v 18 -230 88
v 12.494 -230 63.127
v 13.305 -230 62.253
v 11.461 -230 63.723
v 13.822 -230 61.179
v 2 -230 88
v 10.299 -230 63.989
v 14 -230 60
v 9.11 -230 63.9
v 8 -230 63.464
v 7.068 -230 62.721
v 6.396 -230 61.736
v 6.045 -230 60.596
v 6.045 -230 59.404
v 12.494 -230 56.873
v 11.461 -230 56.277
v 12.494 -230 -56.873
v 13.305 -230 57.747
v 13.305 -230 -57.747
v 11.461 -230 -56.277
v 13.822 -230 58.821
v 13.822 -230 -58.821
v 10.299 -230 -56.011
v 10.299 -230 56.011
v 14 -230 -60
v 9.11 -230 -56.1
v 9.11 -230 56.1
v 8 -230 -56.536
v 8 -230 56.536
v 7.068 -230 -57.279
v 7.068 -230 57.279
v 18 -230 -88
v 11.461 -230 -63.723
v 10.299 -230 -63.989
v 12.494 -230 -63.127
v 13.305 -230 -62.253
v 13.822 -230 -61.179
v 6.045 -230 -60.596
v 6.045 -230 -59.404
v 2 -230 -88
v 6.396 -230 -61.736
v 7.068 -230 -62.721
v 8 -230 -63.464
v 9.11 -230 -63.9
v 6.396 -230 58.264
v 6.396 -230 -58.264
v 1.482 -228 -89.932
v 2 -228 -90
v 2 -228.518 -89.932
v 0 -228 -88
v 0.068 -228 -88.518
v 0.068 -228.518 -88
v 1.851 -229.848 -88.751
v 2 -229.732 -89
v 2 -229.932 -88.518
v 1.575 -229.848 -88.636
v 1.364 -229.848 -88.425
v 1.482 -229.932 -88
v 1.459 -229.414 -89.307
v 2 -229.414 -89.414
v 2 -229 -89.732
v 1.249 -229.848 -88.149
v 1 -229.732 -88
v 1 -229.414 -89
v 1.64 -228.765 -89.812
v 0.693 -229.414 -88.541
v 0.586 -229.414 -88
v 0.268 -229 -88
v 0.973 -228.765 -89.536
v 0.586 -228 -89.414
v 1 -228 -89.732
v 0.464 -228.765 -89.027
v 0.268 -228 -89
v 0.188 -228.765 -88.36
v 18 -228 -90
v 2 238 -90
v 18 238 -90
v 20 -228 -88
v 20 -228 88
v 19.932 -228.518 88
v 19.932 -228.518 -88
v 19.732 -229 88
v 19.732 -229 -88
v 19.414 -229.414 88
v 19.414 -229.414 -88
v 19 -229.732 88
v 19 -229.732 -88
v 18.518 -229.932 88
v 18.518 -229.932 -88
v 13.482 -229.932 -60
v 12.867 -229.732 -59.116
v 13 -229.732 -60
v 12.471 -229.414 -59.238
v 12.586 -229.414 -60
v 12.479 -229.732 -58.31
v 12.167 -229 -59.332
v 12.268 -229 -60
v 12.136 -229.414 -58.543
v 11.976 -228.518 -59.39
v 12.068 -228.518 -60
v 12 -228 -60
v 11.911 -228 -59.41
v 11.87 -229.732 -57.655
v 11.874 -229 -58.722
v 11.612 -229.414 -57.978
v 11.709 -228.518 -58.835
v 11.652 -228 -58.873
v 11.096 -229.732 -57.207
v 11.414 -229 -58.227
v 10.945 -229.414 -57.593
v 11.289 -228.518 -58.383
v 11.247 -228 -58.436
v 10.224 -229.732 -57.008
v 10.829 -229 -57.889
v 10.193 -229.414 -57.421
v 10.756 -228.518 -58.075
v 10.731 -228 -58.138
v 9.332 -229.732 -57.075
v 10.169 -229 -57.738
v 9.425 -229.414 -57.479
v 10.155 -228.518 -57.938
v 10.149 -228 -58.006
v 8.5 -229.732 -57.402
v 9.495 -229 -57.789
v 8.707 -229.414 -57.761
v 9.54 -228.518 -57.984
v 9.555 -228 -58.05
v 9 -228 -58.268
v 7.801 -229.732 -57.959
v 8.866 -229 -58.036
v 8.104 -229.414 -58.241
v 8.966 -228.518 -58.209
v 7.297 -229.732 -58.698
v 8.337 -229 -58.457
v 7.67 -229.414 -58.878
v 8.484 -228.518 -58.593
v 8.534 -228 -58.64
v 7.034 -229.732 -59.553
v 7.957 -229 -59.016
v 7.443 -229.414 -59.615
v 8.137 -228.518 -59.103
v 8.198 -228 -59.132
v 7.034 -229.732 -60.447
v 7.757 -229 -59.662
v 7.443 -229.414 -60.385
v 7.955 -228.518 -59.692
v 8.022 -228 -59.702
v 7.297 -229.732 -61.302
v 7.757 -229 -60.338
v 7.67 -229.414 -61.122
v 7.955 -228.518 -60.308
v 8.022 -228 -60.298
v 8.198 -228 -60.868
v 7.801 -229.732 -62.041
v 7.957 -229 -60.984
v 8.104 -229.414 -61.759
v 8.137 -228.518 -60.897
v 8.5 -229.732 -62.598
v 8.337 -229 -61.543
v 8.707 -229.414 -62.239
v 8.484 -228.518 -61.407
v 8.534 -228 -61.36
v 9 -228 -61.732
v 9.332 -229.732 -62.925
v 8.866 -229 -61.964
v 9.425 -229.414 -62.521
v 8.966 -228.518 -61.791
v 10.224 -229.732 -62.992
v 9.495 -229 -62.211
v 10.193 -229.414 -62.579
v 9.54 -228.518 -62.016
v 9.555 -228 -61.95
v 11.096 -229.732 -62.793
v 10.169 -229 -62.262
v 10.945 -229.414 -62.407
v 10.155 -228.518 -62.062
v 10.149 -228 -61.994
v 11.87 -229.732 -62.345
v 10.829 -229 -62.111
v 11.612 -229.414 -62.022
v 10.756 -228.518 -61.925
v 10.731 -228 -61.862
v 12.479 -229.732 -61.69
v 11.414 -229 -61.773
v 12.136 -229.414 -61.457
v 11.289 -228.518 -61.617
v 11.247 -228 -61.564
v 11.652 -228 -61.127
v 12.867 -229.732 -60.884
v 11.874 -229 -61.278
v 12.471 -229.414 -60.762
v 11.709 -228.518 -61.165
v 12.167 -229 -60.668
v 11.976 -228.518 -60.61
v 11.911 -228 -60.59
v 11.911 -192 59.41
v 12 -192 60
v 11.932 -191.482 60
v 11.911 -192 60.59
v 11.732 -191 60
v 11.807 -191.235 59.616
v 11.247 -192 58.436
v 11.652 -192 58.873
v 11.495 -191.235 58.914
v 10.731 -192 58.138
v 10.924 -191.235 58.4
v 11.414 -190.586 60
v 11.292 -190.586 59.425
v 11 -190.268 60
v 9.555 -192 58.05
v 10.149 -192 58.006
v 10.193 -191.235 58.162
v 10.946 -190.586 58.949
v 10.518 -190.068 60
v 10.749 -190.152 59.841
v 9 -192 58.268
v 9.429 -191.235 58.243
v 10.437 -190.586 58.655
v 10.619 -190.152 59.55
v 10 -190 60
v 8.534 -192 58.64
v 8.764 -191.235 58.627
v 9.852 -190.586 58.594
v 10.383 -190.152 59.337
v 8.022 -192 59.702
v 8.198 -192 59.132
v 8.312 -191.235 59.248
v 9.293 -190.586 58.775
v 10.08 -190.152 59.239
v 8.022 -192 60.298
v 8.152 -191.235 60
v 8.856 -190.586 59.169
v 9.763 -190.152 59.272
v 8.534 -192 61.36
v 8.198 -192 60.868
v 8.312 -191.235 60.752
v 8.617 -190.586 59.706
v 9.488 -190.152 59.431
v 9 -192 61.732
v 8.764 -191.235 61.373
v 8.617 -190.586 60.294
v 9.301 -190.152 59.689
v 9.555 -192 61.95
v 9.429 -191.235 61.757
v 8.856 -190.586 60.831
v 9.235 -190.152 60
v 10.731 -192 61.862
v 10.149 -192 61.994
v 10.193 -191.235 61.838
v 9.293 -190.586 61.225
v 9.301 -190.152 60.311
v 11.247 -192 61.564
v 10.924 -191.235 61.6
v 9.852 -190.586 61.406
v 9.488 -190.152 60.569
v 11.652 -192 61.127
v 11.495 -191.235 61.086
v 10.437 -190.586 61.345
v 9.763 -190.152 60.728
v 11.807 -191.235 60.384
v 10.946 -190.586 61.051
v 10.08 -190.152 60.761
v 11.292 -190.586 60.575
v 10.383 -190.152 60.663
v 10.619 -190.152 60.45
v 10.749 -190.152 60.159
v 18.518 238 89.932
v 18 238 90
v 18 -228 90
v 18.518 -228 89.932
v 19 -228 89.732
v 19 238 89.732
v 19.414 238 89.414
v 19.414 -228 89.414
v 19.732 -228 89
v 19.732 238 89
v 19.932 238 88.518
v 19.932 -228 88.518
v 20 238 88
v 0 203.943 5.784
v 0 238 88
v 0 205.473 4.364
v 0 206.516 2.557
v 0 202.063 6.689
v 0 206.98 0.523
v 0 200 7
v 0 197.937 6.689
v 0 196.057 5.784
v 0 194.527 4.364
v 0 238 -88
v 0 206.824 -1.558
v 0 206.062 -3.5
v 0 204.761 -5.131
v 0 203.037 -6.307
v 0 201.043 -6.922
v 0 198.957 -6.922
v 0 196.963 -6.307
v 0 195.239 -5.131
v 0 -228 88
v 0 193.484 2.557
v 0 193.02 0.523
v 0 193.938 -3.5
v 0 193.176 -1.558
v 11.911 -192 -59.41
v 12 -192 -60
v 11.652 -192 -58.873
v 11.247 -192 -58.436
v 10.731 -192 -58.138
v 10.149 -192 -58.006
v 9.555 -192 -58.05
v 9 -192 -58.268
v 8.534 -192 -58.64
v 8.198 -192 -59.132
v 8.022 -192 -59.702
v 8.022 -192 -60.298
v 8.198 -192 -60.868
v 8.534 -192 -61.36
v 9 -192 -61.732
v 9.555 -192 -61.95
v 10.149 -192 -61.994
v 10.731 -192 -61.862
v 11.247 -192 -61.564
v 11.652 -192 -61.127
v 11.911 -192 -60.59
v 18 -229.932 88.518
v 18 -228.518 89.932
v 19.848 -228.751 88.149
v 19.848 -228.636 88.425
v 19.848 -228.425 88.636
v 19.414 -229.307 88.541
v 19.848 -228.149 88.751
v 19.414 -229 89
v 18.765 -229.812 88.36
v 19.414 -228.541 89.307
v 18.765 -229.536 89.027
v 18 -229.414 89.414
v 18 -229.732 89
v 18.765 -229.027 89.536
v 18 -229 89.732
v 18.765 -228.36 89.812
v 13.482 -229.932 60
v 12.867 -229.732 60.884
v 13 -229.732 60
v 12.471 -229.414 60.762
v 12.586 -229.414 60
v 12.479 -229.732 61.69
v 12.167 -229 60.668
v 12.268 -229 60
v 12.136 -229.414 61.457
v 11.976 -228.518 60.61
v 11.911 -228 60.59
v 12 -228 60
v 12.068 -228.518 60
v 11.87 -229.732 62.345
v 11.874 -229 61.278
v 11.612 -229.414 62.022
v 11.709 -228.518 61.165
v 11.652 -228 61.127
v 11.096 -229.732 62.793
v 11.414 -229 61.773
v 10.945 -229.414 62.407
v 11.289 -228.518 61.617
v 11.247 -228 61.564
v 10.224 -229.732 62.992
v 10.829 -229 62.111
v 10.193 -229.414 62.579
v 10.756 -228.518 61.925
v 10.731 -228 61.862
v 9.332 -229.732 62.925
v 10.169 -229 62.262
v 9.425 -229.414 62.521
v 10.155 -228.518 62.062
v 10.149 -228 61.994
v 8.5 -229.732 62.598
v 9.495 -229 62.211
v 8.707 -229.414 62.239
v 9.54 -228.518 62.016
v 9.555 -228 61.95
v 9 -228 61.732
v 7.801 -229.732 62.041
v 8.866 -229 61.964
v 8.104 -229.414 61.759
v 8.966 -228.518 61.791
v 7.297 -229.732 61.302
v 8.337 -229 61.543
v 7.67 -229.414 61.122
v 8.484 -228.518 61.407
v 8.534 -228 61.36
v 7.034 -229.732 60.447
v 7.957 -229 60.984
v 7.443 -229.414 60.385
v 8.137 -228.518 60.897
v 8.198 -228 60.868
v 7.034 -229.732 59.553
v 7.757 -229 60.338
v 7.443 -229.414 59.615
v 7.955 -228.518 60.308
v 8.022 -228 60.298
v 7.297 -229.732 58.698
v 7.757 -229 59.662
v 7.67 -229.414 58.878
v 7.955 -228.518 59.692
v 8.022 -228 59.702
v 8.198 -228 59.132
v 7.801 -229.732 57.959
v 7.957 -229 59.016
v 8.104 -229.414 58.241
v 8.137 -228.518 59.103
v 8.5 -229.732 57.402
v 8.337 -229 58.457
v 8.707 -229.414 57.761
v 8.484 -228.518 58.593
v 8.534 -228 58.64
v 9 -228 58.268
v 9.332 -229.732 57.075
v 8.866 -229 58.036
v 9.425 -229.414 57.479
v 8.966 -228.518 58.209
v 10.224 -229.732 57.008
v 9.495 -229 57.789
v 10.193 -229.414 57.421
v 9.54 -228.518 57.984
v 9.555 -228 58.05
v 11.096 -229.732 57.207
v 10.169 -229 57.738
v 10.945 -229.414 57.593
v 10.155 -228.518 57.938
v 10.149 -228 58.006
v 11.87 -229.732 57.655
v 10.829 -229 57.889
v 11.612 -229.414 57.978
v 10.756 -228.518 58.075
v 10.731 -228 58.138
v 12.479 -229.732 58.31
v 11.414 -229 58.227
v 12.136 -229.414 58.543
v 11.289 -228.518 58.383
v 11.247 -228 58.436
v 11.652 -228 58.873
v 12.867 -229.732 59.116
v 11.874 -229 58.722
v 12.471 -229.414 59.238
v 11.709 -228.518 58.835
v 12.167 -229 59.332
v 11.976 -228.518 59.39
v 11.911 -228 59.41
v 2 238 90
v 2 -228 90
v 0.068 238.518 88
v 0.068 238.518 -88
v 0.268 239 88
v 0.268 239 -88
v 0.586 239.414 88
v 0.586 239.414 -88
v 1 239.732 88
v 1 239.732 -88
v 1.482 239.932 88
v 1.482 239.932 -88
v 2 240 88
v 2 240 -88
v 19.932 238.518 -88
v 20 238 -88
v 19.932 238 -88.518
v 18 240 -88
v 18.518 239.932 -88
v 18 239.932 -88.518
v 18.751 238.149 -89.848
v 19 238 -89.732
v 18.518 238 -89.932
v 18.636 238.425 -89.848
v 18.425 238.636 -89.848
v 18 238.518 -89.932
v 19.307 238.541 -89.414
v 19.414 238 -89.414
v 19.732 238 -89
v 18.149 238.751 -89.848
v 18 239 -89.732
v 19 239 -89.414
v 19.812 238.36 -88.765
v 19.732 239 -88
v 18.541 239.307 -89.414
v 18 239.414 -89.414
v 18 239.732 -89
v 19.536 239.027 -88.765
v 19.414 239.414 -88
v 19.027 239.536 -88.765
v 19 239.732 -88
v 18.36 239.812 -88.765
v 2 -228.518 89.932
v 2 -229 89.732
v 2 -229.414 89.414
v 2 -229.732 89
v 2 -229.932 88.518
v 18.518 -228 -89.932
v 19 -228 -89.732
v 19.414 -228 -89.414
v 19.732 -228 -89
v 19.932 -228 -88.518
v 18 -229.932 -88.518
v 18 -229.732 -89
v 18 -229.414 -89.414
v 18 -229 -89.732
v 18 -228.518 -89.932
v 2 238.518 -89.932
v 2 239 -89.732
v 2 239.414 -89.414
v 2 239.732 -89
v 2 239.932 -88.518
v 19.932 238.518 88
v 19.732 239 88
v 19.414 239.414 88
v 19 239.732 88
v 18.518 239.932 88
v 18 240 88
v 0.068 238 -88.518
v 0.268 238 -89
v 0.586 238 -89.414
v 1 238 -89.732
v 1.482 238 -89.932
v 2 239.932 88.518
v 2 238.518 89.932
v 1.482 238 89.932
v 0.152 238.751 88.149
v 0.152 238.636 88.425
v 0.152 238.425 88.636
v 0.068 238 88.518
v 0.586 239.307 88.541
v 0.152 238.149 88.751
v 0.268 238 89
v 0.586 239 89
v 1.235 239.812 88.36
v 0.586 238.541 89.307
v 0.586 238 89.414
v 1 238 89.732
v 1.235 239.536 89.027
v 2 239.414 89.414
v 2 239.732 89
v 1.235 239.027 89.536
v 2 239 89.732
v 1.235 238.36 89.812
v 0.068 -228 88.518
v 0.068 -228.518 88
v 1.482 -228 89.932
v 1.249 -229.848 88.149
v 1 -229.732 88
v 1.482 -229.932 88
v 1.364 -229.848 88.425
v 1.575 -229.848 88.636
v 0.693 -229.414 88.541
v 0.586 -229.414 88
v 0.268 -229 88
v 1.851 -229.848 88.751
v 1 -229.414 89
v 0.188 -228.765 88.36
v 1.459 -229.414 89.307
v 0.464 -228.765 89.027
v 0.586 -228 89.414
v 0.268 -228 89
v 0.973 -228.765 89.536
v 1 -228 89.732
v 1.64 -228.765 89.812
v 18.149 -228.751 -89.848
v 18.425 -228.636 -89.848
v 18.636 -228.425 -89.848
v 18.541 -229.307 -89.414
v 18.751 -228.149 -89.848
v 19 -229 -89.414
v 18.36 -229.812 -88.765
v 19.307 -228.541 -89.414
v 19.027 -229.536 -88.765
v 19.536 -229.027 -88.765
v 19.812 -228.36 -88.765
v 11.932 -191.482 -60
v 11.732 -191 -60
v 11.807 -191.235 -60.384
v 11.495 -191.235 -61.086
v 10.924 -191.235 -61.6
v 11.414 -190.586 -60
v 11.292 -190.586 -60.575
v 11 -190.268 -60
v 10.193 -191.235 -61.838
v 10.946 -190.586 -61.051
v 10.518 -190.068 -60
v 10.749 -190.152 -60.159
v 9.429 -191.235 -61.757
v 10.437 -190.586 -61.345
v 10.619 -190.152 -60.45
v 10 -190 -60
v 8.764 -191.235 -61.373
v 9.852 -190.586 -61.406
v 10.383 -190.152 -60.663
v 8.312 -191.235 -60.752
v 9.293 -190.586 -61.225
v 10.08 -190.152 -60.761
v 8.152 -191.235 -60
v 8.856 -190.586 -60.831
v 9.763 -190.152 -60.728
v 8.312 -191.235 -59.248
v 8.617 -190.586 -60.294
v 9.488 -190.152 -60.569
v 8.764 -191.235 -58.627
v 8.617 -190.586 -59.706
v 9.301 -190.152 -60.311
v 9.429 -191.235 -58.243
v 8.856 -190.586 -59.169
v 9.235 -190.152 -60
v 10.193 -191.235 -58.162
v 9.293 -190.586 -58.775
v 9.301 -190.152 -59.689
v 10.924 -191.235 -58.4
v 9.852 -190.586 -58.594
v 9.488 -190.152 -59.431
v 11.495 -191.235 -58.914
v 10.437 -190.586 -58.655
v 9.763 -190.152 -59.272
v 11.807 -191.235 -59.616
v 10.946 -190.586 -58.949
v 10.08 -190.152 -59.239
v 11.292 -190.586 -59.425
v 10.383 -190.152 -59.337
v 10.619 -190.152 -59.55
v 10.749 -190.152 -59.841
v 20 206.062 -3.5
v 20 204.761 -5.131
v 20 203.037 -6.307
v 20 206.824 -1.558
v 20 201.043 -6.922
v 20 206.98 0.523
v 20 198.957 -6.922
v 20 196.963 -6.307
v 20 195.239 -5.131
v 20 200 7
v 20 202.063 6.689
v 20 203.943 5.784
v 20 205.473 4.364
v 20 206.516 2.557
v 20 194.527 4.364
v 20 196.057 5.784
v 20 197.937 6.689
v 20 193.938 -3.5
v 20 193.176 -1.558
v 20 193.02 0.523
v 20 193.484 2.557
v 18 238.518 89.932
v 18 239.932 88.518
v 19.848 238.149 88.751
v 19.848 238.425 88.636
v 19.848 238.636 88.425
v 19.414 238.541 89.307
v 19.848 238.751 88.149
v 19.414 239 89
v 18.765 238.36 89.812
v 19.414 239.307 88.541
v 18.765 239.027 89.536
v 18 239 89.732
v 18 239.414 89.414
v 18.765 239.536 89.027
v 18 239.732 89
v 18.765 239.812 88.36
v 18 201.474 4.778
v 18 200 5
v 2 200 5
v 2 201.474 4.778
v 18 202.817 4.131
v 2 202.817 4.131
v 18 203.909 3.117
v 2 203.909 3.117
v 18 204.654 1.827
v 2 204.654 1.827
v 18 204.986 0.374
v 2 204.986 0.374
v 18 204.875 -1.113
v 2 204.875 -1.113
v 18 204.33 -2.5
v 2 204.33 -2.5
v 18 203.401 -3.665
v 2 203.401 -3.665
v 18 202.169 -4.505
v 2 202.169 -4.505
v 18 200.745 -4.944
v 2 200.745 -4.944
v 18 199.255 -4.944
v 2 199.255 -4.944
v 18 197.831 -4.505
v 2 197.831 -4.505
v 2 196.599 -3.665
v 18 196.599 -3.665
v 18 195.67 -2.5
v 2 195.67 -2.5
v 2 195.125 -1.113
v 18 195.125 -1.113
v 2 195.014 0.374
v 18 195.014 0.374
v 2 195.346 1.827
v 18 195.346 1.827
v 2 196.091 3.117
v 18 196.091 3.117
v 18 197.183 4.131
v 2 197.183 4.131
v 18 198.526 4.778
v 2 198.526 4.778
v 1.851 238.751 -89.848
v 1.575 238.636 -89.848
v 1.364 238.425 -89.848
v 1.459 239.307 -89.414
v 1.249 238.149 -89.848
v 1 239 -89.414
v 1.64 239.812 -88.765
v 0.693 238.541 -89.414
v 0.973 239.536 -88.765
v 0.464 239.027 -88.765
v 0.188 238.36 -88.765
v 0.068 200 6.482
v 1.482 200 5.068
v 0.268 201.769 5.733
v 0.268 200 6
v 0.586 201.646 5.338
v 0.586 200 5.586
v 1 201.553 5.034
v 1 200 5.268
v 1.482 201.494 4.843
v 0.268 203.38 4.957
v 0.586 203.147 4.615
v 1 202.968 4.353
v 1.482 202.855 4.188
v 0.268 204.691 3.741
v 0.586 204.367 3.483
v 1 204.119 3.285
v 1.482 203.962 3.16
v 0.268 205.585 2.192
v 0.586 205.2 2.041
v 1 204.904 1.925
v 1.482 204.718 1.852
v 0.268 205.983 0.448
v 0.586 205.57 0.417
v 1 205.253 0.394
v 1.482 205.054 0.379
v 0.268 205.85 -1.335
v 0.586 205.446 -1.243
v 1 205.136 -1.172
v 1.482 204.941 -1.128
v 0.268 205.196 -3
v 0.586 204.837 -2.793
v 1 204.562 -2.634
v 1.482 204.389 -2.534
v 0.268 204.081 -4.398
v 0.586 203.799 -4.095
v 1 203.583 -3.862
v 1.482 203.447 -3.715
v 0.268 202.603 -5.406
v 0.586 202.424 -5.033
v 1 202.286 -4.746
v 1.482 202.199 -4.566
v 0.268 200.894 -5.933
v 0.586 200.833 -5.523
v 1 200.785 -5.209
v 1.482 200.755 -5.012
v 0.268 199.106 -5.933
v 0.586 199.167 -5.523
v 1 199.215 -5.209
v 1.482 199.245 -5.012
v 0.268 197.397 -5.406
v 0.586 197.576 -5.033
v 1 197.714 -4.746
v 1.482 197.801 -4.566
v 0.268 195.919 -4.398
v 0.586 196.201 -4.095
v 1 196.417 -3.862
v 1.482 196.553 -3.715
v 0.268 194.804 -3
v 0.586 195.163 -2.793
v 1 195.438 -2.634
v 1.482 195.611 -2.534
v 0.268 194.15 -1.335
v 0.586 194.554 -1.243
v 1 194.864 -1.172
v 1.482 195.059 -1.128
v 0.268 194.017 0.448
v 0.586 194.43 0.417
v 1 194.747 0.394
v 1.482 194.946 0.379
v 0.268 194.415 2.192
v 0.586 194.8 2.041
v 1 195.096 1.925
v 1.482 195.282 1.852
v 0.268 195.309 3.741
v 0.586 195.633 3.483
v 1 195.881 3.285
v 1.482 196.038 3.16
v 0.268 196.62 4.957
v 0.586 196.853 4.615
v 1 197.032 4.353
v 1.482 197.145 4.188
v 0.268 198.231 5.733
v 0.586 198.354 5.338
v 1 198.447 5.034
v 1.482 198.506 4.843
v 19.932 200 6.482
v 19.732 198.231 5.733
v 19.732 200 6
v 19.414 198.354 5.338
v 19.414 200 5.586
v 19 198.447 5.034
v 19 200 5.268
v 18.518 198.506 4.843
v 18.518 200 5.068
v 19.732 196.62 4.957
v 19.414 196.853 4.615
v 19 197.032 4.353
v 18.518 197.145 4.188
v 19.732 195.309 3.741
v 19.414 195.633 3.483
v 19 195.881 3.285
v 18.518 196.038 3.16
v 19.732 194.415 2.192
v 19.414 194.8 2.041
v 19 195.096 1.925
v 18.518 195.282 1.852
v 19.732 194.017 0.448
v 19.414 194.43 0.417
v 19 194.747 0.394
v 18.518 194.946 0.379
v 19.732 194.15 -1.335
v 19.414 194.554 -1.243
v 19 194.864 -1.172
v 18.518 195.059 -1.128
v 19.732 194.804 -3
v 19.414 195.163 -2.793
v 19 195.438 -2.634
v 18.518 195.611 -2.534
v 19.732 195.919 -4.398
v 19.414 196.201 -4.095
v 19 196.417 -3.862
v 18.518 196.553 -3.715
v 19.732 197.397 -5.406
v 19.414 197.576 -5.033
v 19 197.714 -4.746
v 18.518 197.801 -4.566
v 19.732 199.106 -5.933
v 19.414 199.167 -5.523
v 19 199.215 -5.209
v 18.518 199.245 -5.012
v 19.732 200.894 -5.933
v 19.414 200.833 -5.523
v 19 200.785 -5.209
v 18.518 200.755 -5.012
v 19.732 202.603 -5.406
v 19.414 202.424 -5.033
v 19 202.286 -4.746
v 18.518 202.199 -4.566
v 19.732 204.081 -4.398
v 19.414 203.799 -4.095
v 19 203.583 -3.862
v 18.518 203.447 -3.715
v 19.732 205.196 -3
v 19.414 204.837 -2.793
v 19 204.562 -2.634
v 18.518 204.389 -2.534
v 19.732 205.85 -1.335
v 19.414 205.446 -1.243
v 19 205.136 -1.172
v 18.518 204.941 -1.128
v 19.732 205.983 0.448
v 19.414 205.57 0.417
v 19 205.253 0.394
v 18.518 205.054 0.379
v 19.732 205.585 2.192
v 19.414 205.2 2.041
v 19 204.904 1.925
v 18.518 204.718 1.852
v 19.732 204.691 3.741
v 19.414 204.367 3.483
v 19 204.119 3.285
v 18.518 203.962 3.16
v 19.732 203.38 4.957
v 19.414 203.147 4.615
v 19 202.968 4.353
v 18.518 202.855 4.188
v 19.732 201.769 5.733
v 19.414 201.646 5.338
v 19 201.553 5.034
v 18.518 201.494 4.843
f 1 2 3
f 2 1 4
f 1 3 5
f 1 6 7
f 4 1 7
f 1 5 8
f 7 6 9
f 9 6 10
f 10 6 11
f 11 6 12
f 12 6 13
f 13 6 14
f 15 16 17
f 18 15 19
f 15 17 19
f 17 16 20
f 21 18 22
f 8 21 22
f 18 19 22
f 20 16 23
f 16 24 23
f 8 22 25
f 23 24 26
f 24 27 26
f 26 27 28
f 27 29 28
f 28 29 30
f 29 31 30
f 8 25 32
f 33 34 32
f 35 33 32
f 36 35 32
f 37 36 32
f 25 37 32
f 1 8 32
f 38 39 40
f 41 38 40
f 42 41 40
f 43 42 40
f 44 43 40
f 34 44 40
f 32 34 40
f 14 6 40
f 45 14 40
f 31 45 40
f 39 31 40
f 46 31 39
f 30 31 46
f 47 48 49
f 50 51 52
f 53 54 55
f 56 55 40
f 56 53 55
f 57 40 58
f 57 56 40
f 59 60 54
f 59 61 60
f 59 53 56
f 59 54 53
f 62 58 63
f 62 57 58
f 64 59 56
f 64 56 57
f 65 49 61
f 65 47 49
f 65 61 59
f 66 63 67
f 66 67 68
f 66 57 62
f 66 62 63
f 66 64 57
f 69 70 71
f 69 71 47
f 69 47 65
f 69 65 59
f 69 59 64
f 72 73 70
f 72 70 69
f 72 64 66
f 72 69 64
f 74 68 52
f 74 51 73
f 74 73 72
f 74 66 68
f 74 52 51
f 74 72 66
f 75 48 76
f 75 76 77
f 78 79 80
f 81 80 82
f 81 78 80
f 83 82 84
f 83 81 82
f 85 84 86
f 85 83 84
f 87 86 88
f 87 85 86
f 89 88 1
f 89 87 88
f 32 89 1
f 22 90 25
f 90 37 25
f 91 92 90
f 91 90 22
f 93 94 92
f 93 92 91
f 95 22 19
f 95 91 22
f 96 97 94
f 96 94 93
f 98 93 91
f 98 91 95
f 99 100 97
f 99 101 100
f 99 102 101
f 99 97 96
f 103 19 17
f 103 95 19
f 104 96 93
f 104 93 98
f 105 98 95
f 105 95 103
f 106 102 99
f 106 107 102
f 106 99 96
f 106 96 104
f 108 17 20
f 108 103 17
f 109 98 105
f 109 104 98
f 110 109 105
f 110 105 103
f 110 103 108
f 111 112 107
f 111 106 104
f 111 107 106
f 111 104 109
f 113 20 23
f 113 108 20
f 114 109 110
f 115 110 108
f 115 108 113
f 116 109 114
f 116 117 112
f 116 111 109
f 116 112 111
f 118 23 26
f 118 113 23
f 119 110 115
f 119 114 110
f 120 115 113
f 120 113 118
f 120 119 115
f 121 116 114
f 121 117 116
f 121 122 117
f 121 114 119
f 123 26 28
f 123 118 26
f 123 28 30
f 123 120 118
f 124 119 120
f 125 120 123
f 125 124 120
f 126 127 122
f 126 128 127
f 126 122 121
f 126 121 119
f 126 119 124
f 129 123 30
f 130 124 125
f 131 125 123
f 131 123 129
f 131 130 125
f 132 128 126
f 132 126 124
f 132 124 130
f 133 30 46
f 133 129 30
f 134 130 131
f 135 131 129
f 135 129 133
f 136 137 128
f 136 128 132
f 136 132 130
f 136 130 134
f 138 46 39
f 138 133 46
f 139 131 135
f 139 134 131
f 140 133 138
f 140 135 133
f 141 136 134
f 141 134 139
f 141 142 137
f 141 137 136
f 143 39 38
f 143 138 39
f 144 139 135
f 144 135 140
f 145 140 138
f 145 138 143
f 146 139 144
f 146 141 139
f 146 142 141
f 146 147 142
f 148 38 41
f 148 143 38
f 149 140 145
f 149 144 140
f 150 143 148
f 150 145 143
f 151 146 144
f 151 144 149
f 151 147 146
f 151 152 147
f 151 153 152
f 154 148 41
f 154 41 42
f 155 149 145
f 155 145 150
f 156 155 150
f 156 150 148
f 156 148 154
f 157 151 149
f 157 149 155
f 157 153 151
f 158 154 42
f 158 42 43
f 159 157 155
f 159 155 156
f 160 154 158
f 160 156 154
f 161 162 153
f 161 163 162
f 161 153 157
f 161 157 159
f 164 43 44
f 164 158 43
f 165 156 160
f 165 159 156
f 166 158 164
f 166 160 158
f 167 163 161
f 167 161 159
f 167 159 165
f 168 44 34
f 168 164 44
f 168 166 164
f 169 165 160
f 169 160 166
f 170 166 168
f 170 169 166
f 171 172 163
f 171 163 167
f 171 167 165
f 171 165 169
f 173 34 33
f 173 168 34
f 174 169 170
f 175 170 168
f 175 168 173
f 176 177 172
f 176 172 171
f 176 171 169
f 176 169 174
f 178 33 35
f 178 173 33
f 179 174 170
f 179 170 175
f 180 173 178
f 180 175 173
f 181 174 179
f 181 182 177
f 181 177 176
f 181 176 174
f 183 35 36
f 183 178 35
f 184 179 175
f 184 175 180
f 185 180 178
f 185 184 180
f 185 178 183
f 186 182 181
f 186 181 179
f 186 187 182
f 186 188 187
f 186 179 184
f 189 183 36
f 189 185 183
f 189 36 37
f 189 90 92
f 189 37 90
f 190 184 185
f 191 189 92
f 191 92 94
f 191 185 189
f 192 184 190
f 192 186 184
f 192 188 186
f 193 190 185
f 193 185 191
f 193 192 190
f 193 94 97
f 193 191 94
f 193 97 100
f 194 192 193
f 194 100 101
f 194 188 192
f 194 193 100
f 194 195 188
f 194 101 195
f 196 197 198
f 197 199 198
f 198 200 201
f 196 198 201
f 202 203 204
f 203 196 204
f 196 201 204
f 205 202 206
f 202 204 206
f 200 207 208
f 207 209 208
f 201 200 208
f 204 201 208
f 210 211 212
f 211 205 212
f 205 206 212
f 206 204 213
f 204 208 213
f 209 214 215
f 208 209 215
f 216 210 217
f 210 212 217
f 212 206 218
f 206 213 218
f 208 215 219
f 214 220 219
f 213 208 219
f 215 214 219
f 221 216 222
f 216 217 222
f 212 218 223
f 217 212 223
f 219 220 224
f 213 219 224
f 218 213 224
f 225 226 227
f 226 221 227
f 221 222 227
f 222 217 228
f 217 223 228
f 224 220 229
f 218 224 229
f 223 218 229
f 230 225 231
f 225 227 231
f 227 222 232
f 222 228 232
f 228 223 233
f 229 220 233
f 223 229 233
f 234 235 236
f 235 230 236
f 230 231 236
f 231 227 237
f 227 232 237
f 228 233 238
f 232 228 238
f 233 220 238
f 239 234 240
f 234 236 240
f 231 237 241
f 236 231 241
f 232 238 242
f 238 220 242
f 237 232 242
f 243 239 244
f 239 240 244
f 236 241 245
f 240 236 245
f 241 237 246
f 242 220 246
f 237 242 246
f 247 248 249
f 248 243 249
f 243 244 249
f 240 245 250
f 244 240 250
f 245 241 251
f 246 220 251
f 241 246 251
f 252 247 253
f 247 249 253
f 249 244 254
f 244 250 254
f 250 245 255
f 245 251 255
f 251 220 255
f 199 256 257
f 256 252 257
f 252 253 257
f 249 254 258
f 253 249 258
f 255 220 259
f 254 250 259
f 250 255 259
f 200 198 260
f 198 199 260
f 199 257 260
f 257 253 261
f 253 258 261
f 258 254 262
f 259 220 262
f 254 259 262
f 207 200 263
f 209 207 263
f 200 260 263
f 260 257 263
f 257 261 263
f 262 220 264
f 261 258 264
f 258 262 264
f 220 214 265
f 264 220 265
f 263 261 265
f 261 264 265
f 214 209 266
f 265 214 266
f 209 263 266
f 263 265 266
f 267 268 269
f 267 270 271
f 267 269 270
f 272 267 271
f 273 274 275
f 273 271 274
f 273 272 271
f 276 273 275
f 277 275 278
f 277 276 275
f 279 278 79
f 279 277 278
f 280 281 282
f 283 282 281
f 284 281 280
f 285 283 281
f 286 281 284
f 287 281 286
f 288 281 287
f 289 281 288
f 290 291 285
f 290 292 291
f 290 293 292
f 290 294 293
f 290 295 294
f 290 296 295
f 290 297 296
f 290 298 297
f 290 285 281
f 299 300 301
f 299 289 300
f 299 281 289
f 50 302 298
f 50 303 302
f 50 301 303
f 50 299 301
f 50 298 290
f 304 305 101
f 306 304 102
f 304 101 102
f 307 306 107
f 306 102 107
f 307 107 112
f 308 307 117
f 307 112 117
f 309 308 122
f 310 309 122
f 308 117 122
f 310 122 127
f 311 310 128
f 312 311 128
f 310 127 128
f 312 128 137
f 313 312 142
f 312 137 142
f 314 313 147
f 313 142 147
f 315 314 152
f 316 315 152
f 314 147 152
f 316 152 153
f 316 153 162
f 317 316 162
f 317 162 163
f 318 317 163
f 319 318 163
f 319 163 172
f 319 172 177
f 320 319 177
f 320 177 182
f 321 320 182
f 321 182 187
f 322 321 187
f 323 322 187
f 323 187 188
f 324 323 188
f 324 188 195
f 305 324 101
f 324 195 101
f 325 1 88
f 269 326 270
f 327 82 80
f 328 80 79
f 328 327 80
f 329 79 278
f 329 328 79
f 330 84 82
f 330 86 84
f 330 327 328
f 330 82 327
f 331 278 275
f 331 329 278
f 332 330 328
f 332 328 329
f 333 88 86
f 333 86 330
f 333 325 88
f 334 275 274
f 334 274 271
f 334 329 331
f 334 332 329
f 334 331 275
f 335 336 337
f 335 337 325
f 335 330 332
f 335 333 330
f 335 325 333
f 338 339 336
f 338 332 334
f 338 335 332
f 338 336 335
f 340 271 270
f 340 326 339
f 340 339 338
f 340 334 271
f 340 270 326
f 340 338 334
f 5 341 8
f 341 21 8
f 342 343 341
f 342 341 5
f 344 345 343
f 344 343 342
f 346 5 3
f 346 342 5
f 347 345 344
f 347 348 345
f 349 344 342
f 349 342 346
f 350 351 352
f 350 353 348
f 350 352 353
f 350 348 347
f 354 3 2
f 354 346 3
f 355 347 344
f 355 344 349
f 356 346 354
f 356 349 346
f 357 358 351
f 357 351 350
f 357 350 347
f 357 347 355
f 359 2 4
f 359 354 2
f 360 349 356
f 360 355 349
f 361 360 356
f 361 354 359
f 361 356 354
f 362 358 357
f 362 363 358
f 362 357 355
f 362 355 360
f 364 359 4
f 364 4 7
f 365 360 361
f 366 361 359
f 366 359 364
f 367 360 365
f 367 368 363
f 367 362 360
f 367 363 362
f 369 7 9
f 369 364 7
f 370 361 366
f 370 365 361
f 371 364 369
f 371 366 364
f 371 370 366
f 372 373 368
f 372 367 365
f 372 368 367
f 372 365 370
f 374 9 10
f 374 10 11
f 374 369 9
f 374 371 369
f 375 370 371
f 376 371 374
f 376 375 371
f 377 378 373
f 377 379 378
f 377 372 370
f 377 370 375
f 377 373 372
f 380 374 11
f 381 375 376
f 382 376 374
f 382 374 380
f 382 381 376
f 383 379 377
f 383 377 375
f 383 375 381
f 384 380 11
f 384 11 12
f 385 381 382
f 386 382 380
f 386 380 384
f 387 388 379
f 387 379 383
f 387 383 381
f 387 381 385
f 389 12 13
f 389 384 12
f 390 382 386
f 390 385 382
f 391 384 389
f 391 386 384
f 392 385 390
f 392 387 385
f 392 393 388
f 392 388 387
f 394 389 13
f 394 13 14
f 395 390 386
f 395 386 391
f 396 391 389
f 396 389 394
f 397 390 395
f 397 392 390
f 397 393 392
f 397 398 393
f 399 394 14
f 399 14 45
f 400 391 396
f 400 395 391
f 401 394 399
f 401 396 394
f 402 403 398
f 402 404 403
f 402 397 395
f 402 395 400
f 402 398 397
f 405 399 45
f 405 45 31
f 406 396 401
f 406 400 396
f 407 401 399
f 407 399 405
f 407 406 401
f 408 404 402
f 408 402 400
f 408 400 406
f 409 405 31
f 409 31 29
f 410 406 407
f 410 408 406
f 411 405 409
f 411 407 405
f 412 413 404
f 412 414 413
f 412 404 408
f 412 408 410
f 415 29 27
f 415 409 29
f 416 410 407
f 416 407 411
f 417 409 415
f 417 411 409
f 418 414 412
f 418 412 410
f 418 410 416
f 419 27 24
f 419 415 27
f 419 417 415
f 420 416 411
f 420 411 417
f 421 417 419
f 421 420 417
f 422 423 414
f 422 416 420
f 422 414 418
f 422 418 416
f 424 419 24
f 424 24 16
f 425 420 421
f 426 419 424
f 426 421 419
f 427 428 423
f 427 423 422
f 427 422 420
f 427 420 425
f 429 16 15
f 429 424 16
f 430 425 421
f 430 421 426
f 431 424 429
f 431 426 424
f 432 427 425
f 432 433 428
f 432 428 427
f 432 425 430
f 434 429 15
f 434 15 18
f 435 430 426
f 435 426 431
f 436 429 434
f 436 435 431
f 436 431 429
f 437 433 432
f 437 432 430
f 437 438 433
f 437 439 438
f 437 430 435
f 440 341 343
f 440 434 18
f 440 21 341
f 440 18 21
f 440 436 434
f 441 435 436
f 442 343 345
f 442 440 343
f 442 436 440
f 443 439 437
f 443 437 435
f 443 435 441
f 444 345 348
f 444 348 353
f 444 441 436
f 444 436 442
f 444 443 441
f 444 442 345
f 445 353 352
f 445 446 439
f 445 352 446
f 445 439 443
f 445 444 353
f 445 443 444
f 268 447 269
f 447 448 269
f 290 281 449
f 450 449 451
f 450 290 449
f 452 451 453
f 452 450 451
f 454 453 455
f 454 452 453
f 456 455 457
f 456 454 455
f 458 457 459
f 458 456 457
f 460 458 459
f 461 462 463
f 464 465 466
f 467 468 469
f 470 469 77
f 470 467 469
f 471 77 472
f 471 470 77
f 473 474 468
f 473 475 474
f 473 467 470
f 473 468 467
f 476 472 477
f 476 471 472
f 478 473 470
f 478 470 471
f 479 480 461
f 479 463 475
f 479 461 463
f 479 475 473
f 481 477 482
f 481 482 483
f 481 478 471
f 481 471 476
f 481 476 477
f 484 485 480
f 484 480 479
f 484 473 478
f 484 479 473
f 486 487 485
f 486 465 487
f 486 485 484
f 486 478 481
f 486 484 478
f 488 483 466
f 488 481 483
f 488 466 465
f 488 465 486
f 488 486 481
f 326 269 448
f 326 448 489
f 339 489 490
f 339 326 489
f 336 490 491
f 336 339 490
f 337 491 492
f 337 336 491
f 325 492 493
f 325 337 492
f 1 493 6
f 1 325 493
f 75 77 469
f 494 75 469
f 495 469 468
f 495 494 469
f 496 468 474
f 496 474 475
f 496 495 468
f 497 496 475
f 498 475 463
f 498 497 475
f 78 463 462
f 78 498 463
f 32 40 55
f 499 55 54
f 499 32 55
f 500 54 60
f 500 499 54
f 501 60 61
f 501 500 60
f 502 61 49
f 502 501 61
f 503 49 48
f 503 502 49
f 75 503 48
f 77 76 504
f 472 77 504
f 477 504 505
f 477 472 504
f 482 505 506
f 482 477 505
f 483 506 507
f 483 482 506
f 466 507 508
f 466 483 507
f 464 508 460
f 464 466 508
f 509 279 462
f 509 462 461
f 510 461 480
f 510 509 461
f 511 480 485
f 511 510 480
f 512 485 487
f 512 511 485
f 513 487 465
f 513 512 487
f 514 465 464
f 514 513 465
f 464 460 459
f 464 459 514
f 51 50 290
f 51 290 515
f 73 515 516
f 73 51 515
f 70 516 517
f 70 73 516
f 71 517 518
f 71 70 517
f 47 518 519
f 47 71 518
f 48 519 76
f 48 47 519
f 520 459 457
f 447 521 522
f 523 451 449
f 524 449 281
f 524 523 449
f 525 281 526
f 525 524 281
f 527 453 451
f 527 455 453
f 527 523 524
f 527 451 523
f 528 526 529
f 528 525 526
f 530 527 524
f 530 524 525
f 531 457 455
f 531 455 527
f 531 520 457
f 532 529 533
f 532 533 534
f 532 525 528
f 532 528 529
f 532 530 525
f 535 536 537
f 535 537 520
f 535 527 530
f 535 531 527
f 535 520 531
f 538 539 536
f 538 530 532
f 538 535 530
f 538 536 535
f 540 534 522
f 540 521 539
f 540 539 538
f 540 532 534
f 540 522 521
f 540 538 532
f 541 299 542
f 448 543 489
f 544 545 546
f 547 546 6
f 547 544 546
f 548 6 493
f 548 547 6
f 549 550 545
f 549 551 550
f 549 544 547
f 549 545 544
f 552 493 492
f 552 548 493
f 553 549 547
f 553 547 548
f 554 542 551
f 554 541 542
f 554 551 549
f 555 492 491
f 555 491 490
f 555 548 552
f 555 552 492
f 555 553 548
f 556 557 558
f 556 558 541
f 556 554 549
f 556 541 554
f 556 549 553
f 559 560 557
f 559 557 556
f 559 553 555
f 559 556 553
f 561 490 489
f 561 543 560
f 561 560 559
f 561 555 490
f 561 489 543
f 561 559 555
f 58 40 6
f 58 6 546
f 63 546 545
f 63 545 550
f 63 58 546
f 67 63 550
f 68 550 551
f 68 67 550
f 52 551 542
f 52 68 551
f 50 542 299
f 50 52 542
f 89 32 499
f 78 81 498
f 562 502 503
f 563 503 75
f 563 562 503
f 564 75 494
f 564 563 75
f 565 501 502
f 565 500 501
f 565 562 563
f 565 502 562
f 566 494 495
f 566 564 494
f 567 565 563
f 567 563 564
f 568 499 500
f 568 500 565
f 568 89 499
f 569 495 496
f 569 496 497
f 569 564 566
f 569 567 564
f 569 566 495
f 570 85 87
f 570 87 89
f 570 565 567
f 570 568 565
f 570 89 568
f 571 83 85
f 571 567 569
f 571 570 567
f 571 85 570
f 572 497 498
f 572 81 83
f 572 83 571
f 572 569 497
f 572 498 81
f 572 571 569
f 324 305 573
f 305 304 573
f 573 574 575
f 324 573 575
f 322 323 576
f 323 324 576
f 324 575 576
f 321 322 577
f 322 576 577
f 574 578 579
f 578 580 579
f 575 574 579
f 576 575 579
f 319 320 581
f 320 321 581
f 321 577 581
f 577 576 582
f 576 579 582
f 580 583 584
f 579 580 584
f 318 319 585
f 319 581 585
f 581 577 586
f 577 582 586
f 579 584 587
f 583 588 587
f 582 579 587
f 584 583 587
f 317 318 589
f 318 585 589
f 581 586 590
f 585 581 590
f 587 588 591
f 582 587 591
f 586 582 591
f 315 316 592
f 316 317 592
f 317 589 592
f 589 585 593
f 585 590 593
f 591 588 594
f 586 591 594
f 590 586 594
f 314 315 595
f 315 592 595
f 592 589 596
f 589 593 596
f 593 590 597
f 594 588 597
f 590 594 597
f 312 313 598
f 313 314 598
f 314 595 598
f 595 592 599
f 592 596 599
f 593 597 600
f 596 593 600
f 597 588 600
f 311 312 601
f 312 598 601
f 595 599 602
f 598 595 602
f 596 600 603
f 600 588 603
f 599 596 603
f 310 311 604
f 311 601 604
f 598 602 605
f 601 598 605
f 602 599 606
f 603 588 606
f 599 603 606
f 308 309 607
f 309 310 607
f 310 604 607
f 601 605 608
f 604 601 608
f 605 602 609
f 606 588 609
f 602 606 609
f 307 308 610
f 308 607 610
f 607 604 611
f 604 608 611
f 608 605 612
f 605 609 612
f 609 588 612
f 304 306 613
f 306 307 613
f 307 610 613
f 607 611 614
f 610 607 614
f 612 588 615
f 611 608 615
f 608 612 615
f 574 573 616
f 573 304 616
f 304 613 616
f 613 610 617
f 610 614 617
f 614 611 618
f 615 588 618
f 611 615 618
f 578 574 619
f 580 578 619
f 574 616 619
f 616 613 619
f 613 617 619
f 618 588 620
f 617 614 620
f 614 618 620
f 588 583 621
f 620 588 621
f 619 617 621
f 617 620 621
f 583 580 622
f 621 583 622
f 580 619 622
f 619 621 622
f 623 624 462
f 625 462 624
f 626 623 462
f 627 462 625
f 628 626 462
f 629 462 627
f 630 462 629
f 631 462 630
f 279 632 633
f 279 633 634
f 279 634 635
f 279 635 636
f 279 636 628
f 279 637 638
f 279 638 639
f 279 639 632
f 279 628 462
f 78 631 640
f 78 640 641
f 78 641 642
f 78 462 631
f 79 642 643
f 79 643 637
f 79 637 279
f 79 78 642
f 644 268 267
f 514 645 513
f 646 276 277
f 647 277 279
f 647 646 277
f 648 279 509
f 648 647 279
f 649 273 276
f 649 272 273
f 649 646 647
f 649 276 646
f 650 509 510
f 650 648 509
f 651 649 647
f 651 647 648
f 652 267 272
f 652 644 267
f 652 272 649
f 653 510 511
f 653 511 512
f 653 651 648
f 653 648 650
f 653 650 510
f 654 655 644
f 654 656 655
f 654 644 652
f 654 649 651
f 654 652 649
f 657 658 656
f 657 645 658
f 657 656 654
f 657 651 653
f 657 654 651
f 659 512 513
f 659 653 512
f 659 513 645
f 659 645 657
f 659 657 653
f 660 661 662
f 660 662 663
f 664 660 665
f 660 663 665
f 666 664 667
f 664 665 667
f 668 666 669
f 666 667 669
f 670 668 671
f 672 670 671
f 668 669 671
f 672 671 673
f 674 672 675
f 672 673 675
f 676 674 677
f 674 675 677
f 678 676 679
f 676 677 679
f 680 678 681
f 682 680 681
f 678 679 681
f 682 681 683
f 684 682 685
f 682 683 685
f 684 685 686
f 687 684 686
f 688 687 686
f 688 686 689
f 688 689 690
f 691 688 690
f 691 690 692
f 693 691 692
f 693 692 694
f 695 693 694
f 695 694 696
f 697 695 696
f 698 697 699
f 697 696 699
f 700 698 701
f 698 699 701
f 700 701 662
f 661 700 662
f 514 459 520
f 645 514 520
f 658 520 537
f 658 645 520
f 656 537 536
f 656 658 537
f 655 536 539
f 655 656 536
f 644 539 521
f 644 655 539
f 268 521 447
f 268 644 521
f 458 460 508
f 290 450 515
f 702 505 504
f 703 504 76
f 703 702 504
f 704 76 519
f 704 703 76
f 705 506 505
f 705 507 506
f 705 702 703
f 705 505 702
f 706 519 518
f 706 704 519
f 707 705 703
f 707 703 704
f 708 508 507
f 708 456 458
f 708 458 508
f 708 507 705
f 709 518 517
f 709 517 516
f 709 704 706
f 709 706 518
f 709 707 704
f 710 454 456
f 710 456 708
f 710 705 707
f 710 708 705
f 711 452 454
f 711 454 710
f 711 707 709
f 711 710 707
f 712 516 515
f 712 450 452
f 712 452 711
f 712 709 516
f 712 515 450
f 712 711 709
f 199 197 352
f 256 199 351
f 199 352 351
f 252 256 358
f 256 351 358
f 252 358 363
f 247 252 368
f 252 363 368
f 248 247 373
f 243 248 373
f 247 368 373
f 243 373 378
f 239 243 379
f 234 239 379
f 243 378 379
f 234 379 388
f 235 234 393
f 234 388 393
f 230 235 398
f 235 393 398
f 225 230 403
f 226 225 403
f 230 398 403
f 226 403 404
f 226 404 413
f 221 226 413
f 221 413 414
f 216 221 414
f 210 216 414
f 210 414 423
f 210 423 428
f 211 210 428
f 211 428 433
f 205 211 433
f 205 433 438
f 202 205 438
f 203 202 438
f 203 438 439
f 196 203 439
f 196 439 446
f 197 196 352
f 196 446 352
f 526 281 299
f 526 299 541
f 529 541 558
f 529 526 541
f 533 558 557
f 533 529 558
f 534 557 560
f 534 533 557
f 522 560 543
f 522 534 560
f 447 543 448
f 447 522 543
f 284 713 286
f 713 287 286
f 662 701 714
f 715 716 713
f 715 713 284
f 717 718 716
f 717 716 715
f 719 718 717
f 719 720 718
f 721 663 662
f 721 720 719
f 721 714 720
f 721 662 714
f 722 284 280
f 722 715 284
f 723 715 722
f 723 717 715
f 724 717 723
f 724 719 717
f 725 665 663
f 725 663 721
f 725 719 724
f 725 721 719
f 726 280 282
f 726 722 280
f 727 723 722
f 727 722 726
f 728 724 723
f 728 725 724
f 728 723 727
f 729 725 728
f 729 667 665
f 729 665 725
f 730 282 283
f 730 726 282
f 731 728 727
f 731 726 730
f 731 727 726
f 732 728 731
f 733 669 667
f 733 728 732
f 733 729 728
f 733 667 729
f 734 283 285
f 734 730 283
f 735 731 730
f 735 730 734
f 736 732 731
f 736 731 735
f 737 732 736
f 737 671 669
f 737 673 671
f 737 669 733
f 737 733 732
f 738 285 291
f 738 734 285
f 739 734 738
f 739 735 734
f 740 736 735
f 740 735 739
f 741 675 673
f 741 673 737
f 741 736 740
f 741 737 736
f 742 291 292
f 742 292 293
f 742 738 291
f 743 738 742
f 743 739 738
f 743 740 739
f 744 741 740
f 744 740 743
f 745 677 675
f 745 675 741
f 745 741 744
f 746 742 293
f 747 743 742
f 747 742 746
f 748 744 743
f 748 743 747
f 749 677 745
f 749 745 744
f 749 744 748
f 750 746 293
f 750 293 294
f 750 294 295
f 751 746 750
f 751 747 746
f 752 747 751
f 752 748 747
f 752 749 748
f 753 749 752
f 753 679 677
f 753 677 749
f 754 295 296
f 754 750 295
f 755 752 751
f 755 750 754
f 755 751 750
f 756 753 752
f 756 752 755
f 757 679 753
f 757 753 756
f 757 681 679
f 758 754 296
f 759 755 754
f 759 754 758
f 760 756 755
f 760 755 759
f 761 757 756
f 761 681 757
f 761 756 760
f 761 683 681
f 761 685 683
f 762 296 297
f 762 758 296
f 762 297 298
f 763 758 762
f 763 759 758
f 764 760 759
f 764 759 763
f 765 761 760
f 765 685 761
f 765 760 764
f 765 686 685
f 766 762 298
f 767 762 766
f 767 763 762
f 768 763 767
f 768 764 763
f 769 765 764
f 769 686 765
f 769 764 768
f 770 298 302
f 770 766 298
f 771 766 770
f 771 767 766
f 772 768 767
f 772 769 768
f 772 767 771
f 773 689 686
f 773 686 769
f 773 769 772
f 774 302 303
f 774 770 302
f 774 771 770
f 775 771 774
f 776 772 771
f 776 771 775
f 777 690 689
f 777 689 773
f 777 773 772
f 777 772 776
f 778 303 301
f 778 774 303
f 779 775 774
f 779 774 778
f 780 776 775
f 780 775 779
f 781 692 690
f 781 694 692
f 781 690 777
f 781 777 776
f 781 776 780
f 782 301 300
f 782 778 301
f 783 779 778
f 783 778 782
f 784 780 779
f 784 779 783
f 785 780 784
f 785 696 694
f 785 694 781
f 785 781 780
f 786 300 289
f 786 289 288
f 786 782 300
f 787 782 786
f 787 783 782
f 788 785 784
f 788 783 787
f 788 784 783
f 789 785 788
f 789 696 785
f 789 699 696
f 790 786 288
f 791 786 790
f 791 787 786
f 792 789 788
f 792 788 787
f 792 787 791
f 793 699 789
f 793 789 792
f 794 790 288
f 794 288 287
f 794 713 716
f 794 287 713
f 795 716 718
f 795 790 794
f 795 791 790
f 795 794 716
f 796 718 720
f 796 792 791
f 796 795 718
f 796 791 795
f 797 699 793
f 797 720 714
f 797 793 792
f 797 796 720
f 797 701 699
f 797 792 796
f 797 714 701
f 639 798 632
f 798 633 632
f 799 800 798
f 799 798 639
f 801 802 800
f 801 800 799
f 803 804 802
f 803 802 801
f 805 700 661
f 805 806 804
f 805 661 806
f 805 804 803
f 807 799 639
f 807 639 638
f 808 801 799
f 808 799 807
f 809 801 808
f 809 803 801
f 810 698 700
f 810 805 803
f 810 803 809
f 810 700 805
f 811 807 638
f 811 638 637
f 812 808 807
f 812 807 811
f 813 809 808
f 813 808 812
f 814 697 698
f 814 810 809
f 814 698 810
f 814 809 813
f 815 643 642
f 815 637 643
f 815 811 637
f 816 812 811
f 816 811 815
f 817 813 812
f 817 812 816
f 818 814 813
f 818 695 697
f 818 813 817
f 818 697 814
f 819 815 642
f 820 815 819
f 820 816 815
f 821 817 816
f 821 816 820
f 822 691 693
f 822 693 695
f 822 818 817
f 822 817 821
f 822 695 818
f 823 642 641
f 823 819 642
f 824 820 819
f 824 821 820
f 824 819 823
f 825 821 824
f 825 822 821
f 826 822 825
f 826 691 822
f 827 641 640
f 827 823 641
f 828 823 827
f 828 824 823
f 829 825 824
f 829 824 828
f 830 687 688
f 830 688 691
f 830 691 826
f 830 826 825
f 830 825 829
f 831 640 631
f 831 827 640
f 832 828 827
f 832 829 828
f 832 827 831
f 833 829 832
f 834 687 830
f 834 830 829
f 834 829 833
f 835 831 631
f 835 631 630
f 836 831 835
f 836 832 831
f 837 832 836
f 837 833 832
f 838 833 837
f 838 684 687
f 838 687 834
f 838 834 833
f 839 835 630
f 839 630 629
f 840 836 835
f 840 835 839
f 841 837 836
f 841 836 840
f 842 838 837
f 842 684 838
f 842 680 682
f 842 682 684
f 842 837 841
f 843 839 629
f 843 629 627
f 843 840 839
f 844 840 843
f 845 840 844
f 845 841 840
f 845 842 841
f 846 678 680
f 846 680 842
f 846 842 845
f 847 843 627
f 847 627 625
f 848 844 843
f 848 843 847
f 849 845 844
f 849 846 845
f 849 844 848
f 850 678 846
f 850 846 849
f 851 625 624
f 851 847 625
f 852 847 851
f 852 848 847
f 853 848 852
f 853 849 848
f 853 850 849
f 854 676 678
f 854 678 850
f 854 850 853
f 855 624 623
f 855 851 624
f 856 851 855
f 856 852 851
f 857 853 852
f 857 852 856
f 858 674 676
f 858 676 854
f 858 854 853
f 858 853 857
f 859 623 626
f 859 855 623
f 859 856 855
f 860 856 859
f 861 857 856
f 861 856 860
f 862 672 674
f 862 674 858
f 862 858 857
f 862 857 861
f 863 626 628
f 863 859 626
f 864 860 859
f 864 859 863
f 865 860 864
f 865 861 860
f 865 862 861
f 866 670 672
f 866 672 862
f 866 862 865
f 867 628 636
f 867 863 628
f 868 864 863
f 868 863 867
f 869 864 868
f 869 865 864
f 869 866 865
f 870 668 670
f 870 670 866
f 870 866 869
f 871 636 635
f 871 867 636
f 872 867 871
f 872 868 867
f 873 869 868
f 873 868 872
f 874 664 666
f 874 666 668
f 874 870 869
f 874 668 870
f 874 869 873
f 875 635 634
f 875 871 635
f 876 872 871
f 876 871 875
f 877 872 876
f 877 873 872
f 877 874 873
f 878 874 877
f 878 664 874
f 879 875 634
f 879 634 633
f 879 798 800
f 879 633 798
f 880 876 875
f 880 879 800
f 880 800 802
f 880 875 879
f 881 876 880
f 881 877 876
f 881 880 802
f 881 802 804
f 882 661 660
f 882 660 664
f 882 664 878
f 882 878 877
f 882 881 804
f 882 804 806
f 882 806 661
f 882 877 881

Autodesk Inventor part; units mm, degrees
ref_plane "YZ Plane" through (0, 0, 0) normal (1, 0, 0) x (0, 1, 0)
ref_plane "XZ Plane" through (0, 0, 0) normal (0, 1, 0) x (-1, 0, 0)
ref_plane "XY Plane" through (0, 0, 0) normal (0, 0, 1) x (1, 0, 0)
sketch "草图1" plane through (0, 0, 0) normal (1, 0, 0) x (0, 1, 0)
  line L0 (230, 90) -> (-230, 90)
  line L1 (-230, 90) -> (-230, -90)
  line L2 (-230, -90) -> (230, -90)
  line L3 (230, -90) -> (230, 90)
  point P0 (0, 0)
  dimension "d0" = 460
  dimension "d1" = 180
extrude "拉伸1" add sketch "草图1" along normal blind 20
sketch "草图2" plane through (0, -230, -90) normal (0, -1, 0) x (1, 0, 0)
  circle A0 centre (10, 30) radius 2
  point P0 (0, 90)
  dimension "d4" = 4
extrude "拉伸2" cut sketch "草图2" against normal blind 40
sketch "草图3" plane through (0, -230, -90) normal (0, -1, 0) x (1, 0, 0)
  circle A0 centre (10, 150) radius 2
  point P0 (0, 90)
  dimension "d7" = 4
extrude "拉伸3" cut sketch "草图3" against normal blind 40
sketch "草图4" plane through (0, 230, 90) normal (0, 1, 0) x (1, 0, 0)
  line L0 (20, 0) -> (20, 180) projected
  line L1 (0, 0) -> (20, 0)
  line L2 (20, 0) -> (20, 180)
  line L3 (20, 180) -> (0, 180)
  line L4 (0, 180) -> (0, 0)
  point P0 (0, 90)
extrude "拉伸4" cut sketch "草图4" against normal blind 60
sketch "草图5" plane through (0, 170, 90) normal (0, 1, 0) x (1, 0, 0)
  line L0 (0, 0) -> (0, 180) projected
  line L1 (0, 0) -> (20, 0) projected
  line L2 (0, 180) -> (20, 180)
  line L3 (20, 180) -> (20, 0)
  line L4 (20, 0) -> (0, 0)
  line L5 (0, 0) -> (0, 180)
  point P0 (0, 90)
extrude "拉伸5" add sketch "草图5" along normal blind 50
sketch "草图6" plane through (0, 0, 0) normal (-1, 0, 0) x (0, 0, 1)
  circle A0 centre (0, 200) radius 5
  point P0 (0, 0)
  dimension "d14" = 10
extrude "拉伸6" cut sketch "草图6" against normal through all
sketch "草图7" plane through (0, 220, 90) normal (0, 1, 0) x (1, 0, 0)
  line L0 (0, 0) -> (20, 0) projected
  line L1 (20, 0) -> (0, 0)
  line L2 (0, 0) -> (0, 180)
  line L3 (0, 180) -> (20, 180)
  line L4 (20, 180) -> (20, 0)
  point P0 (0, 90)
extrude "拉伸7" add sketch "草图7" along normal blind 20
fillet "圆角1" radius 2 2 edges at (8, -190, 60) (8, -190, -60)
fillet "圆角1" radius 2 16 edges at (10, 240, 90) (0, 5, 90) (10, -230, 90) (20, 5, 90) (20, 240, 0) (20, -230, 0) (20, 5, -90) (20, 200, -5) (0, 240, 0) (0, 5, -90) (0, -230, 0) (0, 200, -5) (10, 240, -90) (10, -230, -90) (8, -230, 60) (8, -230, -60)
properties part number "内层正板"
